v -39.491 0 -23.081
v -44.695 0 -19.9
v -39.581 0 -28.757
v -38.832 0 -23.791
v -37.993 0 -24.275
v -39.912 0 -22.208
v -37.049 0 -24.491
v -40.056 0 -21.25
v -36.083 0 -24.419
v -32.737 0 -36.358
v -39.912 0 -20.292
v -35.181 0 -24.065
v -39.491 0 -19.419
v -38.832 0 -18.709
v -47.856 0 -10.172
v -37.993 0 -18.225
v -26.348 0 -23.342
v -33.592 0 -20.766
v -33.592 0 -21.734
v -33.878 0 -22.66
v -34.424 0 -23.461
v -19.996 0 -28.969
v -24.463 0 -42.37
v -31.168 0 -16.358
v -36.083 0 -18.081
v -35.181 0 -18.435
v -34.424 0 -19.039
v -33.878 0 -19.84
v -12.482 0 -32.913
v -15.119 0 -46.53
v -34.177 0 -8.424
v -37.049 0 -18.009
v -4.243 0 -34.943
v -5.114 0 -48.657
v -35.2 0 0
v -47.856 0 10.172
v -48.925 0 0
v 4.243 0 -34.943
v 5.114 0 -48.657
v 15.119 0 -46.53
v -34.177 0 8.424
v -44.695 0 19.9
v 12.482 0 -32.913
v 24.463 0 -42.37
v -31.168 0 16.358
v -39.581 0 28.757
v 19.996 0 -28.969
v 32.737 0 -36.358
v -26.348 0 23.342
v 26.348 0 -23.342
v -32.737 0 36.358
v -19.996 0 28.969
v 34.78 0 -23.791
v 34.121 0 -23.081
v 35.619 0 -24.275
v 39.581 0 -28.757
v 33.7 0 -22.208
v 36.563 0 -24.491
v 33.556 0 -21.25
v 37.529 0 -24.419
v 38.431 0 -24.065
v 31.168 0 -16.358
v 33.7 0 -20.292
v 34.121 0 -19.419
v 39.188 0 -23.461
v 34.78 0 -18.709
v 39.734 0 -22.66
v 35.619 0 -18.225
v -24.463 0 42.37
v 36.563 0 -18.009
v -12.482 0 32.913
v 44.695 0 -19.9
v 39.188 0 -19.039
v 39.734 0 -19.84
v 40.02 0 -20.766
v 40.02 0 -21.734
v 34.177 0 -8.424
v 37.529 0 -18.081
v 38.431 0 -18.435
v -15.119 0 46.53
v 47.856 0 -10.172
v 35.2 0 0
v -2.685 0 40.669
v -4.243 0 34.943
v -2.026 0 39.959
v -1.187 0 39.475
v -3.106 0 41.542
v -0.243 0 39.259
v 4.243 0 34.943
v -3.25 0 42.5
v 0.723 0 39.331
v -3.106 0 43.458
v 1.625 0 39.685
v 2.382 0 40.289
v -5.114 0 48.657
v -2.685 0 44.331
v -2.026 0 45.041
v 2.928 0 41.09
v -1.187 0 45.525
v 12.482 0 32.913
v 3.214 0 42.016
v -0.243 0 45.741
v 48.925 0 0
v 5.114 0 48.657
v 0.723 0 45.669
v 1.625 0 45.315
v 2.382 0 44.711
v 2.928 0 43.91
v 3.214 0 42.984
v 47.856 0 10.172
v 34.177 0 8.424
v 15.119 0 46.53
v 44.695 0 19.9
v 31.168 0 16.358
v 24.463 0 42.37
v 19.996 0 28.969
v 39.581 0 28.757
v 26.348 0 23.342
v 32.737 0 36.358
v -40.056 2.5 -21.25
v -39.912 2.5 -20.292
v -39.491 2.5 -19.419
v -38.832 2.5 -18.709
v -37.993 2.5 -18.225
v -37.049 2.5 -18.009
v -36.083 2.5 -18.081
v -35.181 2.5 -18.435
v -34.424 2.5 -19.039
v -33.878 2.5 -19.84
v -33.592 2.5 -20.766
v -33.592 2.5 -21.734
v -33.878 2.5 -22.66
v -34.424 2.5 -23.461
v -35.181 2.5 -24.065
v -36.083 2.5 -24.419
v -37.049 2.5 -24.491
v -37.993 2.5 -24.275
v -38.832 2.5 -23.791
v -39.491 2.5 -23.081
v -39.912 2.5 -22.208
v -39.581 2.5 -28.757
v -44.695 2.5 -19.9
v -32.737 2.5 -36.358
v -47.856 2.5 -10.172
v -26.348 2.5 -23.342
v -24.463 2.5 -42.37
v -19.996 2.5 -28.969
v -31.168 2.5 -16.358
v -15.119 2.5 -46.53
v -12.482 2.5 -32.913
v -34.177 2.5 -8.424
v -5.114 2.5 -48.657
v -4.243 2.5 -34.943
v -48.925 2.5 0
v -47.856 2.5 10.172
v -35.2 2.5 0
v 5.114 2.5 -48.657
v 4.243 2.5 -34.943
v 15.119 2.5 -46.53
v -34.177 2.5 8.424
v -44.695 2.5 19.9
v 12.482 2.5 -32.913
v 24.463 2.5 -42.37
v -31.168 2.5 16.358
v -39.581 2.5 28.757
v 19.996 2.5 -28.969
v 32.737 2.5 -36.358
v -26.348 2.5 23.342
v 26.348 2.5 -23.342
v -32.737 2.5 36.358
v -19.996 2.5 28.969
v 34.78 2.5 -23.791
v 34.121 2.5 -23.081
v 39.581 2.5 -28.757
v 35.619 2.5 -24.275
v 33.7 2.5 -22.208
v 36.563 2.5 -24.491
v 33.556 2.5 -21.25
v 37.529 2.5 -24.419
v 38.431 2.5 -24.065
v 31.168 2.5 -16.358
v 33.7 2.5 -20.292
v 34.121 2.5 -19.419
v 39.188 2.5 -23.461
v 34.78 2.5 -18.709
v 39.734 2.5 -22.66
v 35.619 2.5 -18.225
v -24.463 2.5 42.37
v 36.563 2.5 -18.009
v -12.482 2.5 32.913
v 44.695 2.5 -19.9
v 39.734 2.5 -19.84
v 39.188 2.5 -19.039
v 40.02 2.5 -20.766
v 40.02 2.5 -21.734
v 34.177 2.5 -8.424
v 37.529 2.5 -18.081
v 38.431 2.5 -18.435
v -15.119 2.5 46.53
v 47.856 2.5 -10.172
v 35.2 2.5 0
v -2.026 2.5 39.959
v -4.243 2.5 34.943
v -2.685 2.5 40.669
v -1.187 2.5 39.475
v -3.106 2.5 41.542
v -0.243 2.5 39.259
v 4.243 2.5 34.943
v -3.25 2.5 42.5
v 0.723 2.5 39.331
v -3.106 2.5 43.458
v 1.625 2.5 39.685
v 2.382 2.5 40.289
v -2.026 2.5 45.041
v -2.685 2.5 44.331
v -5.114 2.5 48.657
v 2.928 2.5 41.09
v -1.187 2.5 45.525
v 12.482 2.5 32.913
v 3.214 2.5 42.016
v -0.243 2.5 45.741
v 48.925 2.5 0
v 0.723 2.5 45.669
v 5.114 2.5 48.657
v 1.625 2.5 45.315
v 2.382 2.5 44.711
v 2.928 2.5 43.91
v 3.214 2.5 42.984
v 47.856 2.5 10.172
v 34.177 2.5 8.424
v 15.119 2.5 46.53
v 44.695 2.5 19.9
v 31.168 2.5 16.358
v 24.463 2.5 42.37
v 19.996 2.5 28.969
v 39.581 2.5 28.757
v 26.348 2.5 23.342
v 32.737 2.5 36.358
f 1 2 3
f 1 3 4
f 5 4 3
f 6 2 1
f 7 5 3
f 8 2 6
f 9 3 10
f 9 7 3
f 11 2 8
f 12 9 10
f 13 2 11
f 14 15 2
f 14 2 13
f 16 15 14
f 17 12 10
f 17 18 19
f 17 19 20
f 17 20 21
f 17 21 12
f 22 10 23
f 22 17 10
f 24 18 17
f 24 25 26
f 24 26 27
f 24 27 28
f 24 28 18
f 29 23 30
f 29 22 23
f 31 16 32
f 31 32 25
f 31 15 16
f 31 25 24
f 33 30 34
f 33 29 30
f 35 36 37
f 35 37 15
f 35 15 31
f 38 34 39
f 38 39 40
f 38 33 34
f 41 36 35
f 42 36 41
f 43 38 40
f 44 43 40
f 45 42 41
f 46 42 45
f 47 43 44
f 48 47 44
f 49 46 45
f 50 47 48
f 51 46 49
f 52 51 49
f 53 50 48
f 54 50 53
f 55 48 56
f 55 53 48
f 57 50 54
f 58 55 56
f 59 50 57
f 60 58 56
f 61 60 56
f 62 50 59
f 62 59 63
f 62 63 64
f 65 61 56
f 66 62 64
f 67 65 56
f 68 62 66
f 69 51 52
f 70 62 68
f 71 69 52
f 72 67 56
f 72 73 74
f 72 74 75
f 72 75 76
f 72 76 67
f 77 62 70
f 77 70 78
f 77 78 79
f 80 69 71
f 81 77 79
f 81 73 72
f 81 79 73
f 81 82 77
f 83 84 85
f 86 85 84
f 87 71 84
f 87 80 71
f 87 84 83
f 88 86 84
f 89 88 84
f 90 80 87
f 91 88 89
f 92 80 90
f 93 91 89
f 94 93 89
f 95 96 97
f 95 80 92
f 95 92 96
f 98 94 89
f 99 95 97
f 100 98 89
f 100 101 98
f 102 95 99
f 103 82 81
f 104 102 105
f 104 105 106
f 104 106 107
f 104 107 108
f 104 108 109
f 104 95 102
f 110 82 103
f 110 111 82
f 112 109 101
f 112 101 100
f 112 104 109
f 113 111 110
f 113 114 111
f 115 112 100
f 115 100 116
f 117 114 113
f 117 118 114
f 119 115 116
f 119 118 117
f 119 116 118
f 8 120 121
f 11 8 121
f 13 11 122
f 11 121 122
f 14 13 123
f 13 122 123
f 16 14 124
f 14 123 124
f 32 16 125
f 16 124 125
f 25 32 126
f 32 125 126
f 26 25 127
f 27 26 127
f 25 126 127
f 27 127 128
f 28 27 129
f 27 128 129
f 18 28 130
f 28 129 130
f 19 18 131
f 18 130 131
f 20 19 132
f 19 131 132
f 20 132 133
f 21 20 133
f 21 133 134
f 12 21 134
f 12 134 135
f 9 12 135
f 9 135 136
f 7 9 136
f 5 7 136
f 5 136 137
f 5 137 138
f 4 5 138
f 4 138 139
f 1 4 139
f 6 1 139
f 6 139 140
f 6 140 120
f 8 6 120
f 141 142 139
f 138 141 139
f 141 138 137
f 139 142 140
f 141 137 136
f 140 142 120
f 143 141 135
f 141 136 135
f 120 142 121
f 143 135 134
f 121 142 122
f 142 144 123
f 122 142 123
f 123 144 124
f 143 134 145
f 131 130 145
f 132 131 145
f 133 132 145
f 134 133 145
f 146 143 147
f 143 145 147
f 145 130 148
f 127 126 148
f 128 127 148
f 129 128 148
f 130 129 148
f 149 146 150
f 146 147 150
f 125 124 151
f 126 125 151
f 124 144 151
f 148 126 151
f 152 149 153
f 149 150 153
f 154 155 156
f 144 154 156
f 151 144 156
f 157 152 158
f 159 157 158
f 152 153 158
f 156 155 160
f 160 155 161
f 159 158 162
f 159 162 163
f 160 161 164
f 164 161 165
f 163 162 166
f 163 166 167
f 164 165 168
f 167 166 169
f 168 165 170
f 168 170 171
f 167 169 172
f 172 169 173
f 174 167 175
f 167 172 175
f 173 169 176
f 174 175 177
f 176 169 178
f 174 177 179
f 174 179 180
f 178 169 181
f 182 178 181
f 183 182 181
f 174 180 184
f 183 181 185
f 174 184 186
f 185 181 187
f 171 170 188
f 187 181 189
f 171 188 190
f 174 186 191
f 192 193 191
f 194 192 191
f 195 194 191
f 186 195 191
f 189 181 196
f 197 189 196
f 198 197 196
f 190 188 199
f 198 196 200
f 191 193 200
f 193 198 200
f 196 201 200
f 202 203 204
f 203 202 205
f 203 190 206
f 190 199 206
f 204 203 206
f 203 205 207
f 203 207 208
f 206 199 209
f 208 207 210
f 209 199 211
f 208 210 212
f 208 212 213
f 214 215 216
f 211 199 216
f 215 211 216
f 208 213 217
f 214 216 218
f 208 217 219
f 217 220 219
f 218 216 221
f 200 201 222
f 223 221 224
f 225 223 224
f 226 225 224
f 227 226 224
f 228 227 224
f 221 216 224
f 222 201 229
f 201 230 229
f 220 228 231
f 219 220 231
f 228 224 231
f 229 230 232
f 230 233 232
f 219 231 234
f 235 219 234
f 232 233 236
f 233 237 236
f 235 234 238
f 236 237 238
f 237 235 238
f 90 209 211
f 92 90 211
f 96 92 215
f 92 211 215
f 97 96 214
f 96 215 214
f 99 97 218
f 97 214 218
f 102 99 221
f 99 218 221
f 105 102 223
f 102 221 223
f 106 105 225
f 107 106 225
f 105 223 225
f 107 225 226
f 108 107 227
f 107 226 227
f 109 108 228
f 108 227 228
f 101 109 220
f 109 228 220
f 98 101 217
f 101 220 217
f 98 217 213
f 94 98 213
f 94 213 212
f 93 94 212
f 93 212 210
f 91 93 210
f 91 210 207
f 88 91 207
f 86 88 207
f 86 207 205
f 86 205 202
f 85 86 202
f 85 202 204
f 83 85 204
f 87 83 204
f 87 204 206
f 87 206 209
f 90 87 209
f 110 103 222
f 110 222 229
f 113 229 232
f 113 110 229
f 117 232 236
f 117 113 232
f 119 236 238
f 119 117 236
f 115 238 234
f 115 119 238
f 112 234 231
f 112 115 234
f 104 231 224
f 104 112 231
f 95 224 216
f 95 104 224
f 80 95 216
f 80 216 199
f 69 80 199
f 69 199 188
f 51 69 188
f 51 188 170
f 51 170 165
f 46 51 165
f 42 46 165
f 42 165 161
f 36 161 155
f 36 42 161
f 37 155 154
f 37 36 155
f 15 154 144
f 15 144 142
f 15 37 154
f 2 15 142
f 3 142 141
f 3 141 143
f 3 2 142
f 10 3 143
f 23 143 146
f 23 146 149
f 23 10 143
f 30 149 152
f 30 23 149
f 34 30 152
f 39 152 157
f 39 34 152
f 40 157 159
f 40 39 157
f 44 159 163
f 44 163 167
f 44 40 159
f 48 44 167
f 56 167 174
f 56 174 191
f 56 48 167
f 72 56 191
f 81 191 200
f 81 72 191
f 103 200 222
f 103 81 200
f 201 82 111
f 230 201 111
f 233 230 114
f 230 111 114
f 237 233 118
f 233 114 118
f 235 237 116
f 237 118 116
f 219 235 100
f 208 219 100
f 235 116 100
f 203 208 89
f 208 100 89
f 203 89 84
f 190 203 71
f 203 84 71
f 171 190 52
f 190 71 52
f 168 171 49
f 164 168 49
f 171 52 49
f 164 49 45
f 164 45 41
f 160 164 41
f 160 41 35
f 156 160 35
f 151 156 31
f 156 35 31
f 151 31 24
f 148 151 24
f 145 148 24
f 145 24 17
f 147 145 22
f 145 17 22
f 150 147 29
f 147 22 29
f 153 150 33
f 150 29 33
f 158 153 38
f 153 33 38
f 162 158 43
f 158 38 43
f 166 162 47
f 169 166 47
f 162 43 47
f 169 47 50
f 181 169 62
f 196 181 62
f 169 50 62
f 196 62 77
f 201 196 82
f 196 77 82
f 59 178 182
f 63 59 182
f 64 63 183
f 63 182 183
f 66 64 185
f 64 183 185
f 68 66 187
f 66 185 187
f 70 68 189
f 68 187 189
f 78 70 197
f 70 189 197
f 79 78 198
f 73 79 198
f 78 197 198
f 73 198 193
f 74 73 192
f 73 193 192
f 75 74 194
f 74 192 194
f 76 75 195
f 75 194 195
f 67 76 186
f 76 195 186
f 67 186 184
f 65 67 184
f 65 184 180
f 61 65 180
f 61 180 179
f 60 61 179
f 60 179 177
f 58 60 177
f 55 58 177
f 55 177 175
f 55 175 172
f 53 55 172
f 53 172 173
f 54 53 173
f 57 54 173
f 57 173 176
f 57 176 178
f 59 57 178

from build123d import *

# Parameters (mm, degrees)
F0_R     = 48.925
F0_R_2   = 35.2
F1_DEPTH = 2.5
F3_D     = 6.5


with BuildPart() as f1:
    # F0 (on Front) → F1 (new body)
    with BuildSketch(Plane.XZ):
        Circle(F0_R)
        Circle(F0_R_2, mode=Mode.SUBTRACT)
    extrude(amount=-F1_DEPTH)

    # F3 (through all)
    with Locations(Plane.XZ):
        with Locations((0, 42.5), (-36.80608, -21.25), (36.80608, -21.25)):
            Hole(F3_D / 2)


solid = f1.part
